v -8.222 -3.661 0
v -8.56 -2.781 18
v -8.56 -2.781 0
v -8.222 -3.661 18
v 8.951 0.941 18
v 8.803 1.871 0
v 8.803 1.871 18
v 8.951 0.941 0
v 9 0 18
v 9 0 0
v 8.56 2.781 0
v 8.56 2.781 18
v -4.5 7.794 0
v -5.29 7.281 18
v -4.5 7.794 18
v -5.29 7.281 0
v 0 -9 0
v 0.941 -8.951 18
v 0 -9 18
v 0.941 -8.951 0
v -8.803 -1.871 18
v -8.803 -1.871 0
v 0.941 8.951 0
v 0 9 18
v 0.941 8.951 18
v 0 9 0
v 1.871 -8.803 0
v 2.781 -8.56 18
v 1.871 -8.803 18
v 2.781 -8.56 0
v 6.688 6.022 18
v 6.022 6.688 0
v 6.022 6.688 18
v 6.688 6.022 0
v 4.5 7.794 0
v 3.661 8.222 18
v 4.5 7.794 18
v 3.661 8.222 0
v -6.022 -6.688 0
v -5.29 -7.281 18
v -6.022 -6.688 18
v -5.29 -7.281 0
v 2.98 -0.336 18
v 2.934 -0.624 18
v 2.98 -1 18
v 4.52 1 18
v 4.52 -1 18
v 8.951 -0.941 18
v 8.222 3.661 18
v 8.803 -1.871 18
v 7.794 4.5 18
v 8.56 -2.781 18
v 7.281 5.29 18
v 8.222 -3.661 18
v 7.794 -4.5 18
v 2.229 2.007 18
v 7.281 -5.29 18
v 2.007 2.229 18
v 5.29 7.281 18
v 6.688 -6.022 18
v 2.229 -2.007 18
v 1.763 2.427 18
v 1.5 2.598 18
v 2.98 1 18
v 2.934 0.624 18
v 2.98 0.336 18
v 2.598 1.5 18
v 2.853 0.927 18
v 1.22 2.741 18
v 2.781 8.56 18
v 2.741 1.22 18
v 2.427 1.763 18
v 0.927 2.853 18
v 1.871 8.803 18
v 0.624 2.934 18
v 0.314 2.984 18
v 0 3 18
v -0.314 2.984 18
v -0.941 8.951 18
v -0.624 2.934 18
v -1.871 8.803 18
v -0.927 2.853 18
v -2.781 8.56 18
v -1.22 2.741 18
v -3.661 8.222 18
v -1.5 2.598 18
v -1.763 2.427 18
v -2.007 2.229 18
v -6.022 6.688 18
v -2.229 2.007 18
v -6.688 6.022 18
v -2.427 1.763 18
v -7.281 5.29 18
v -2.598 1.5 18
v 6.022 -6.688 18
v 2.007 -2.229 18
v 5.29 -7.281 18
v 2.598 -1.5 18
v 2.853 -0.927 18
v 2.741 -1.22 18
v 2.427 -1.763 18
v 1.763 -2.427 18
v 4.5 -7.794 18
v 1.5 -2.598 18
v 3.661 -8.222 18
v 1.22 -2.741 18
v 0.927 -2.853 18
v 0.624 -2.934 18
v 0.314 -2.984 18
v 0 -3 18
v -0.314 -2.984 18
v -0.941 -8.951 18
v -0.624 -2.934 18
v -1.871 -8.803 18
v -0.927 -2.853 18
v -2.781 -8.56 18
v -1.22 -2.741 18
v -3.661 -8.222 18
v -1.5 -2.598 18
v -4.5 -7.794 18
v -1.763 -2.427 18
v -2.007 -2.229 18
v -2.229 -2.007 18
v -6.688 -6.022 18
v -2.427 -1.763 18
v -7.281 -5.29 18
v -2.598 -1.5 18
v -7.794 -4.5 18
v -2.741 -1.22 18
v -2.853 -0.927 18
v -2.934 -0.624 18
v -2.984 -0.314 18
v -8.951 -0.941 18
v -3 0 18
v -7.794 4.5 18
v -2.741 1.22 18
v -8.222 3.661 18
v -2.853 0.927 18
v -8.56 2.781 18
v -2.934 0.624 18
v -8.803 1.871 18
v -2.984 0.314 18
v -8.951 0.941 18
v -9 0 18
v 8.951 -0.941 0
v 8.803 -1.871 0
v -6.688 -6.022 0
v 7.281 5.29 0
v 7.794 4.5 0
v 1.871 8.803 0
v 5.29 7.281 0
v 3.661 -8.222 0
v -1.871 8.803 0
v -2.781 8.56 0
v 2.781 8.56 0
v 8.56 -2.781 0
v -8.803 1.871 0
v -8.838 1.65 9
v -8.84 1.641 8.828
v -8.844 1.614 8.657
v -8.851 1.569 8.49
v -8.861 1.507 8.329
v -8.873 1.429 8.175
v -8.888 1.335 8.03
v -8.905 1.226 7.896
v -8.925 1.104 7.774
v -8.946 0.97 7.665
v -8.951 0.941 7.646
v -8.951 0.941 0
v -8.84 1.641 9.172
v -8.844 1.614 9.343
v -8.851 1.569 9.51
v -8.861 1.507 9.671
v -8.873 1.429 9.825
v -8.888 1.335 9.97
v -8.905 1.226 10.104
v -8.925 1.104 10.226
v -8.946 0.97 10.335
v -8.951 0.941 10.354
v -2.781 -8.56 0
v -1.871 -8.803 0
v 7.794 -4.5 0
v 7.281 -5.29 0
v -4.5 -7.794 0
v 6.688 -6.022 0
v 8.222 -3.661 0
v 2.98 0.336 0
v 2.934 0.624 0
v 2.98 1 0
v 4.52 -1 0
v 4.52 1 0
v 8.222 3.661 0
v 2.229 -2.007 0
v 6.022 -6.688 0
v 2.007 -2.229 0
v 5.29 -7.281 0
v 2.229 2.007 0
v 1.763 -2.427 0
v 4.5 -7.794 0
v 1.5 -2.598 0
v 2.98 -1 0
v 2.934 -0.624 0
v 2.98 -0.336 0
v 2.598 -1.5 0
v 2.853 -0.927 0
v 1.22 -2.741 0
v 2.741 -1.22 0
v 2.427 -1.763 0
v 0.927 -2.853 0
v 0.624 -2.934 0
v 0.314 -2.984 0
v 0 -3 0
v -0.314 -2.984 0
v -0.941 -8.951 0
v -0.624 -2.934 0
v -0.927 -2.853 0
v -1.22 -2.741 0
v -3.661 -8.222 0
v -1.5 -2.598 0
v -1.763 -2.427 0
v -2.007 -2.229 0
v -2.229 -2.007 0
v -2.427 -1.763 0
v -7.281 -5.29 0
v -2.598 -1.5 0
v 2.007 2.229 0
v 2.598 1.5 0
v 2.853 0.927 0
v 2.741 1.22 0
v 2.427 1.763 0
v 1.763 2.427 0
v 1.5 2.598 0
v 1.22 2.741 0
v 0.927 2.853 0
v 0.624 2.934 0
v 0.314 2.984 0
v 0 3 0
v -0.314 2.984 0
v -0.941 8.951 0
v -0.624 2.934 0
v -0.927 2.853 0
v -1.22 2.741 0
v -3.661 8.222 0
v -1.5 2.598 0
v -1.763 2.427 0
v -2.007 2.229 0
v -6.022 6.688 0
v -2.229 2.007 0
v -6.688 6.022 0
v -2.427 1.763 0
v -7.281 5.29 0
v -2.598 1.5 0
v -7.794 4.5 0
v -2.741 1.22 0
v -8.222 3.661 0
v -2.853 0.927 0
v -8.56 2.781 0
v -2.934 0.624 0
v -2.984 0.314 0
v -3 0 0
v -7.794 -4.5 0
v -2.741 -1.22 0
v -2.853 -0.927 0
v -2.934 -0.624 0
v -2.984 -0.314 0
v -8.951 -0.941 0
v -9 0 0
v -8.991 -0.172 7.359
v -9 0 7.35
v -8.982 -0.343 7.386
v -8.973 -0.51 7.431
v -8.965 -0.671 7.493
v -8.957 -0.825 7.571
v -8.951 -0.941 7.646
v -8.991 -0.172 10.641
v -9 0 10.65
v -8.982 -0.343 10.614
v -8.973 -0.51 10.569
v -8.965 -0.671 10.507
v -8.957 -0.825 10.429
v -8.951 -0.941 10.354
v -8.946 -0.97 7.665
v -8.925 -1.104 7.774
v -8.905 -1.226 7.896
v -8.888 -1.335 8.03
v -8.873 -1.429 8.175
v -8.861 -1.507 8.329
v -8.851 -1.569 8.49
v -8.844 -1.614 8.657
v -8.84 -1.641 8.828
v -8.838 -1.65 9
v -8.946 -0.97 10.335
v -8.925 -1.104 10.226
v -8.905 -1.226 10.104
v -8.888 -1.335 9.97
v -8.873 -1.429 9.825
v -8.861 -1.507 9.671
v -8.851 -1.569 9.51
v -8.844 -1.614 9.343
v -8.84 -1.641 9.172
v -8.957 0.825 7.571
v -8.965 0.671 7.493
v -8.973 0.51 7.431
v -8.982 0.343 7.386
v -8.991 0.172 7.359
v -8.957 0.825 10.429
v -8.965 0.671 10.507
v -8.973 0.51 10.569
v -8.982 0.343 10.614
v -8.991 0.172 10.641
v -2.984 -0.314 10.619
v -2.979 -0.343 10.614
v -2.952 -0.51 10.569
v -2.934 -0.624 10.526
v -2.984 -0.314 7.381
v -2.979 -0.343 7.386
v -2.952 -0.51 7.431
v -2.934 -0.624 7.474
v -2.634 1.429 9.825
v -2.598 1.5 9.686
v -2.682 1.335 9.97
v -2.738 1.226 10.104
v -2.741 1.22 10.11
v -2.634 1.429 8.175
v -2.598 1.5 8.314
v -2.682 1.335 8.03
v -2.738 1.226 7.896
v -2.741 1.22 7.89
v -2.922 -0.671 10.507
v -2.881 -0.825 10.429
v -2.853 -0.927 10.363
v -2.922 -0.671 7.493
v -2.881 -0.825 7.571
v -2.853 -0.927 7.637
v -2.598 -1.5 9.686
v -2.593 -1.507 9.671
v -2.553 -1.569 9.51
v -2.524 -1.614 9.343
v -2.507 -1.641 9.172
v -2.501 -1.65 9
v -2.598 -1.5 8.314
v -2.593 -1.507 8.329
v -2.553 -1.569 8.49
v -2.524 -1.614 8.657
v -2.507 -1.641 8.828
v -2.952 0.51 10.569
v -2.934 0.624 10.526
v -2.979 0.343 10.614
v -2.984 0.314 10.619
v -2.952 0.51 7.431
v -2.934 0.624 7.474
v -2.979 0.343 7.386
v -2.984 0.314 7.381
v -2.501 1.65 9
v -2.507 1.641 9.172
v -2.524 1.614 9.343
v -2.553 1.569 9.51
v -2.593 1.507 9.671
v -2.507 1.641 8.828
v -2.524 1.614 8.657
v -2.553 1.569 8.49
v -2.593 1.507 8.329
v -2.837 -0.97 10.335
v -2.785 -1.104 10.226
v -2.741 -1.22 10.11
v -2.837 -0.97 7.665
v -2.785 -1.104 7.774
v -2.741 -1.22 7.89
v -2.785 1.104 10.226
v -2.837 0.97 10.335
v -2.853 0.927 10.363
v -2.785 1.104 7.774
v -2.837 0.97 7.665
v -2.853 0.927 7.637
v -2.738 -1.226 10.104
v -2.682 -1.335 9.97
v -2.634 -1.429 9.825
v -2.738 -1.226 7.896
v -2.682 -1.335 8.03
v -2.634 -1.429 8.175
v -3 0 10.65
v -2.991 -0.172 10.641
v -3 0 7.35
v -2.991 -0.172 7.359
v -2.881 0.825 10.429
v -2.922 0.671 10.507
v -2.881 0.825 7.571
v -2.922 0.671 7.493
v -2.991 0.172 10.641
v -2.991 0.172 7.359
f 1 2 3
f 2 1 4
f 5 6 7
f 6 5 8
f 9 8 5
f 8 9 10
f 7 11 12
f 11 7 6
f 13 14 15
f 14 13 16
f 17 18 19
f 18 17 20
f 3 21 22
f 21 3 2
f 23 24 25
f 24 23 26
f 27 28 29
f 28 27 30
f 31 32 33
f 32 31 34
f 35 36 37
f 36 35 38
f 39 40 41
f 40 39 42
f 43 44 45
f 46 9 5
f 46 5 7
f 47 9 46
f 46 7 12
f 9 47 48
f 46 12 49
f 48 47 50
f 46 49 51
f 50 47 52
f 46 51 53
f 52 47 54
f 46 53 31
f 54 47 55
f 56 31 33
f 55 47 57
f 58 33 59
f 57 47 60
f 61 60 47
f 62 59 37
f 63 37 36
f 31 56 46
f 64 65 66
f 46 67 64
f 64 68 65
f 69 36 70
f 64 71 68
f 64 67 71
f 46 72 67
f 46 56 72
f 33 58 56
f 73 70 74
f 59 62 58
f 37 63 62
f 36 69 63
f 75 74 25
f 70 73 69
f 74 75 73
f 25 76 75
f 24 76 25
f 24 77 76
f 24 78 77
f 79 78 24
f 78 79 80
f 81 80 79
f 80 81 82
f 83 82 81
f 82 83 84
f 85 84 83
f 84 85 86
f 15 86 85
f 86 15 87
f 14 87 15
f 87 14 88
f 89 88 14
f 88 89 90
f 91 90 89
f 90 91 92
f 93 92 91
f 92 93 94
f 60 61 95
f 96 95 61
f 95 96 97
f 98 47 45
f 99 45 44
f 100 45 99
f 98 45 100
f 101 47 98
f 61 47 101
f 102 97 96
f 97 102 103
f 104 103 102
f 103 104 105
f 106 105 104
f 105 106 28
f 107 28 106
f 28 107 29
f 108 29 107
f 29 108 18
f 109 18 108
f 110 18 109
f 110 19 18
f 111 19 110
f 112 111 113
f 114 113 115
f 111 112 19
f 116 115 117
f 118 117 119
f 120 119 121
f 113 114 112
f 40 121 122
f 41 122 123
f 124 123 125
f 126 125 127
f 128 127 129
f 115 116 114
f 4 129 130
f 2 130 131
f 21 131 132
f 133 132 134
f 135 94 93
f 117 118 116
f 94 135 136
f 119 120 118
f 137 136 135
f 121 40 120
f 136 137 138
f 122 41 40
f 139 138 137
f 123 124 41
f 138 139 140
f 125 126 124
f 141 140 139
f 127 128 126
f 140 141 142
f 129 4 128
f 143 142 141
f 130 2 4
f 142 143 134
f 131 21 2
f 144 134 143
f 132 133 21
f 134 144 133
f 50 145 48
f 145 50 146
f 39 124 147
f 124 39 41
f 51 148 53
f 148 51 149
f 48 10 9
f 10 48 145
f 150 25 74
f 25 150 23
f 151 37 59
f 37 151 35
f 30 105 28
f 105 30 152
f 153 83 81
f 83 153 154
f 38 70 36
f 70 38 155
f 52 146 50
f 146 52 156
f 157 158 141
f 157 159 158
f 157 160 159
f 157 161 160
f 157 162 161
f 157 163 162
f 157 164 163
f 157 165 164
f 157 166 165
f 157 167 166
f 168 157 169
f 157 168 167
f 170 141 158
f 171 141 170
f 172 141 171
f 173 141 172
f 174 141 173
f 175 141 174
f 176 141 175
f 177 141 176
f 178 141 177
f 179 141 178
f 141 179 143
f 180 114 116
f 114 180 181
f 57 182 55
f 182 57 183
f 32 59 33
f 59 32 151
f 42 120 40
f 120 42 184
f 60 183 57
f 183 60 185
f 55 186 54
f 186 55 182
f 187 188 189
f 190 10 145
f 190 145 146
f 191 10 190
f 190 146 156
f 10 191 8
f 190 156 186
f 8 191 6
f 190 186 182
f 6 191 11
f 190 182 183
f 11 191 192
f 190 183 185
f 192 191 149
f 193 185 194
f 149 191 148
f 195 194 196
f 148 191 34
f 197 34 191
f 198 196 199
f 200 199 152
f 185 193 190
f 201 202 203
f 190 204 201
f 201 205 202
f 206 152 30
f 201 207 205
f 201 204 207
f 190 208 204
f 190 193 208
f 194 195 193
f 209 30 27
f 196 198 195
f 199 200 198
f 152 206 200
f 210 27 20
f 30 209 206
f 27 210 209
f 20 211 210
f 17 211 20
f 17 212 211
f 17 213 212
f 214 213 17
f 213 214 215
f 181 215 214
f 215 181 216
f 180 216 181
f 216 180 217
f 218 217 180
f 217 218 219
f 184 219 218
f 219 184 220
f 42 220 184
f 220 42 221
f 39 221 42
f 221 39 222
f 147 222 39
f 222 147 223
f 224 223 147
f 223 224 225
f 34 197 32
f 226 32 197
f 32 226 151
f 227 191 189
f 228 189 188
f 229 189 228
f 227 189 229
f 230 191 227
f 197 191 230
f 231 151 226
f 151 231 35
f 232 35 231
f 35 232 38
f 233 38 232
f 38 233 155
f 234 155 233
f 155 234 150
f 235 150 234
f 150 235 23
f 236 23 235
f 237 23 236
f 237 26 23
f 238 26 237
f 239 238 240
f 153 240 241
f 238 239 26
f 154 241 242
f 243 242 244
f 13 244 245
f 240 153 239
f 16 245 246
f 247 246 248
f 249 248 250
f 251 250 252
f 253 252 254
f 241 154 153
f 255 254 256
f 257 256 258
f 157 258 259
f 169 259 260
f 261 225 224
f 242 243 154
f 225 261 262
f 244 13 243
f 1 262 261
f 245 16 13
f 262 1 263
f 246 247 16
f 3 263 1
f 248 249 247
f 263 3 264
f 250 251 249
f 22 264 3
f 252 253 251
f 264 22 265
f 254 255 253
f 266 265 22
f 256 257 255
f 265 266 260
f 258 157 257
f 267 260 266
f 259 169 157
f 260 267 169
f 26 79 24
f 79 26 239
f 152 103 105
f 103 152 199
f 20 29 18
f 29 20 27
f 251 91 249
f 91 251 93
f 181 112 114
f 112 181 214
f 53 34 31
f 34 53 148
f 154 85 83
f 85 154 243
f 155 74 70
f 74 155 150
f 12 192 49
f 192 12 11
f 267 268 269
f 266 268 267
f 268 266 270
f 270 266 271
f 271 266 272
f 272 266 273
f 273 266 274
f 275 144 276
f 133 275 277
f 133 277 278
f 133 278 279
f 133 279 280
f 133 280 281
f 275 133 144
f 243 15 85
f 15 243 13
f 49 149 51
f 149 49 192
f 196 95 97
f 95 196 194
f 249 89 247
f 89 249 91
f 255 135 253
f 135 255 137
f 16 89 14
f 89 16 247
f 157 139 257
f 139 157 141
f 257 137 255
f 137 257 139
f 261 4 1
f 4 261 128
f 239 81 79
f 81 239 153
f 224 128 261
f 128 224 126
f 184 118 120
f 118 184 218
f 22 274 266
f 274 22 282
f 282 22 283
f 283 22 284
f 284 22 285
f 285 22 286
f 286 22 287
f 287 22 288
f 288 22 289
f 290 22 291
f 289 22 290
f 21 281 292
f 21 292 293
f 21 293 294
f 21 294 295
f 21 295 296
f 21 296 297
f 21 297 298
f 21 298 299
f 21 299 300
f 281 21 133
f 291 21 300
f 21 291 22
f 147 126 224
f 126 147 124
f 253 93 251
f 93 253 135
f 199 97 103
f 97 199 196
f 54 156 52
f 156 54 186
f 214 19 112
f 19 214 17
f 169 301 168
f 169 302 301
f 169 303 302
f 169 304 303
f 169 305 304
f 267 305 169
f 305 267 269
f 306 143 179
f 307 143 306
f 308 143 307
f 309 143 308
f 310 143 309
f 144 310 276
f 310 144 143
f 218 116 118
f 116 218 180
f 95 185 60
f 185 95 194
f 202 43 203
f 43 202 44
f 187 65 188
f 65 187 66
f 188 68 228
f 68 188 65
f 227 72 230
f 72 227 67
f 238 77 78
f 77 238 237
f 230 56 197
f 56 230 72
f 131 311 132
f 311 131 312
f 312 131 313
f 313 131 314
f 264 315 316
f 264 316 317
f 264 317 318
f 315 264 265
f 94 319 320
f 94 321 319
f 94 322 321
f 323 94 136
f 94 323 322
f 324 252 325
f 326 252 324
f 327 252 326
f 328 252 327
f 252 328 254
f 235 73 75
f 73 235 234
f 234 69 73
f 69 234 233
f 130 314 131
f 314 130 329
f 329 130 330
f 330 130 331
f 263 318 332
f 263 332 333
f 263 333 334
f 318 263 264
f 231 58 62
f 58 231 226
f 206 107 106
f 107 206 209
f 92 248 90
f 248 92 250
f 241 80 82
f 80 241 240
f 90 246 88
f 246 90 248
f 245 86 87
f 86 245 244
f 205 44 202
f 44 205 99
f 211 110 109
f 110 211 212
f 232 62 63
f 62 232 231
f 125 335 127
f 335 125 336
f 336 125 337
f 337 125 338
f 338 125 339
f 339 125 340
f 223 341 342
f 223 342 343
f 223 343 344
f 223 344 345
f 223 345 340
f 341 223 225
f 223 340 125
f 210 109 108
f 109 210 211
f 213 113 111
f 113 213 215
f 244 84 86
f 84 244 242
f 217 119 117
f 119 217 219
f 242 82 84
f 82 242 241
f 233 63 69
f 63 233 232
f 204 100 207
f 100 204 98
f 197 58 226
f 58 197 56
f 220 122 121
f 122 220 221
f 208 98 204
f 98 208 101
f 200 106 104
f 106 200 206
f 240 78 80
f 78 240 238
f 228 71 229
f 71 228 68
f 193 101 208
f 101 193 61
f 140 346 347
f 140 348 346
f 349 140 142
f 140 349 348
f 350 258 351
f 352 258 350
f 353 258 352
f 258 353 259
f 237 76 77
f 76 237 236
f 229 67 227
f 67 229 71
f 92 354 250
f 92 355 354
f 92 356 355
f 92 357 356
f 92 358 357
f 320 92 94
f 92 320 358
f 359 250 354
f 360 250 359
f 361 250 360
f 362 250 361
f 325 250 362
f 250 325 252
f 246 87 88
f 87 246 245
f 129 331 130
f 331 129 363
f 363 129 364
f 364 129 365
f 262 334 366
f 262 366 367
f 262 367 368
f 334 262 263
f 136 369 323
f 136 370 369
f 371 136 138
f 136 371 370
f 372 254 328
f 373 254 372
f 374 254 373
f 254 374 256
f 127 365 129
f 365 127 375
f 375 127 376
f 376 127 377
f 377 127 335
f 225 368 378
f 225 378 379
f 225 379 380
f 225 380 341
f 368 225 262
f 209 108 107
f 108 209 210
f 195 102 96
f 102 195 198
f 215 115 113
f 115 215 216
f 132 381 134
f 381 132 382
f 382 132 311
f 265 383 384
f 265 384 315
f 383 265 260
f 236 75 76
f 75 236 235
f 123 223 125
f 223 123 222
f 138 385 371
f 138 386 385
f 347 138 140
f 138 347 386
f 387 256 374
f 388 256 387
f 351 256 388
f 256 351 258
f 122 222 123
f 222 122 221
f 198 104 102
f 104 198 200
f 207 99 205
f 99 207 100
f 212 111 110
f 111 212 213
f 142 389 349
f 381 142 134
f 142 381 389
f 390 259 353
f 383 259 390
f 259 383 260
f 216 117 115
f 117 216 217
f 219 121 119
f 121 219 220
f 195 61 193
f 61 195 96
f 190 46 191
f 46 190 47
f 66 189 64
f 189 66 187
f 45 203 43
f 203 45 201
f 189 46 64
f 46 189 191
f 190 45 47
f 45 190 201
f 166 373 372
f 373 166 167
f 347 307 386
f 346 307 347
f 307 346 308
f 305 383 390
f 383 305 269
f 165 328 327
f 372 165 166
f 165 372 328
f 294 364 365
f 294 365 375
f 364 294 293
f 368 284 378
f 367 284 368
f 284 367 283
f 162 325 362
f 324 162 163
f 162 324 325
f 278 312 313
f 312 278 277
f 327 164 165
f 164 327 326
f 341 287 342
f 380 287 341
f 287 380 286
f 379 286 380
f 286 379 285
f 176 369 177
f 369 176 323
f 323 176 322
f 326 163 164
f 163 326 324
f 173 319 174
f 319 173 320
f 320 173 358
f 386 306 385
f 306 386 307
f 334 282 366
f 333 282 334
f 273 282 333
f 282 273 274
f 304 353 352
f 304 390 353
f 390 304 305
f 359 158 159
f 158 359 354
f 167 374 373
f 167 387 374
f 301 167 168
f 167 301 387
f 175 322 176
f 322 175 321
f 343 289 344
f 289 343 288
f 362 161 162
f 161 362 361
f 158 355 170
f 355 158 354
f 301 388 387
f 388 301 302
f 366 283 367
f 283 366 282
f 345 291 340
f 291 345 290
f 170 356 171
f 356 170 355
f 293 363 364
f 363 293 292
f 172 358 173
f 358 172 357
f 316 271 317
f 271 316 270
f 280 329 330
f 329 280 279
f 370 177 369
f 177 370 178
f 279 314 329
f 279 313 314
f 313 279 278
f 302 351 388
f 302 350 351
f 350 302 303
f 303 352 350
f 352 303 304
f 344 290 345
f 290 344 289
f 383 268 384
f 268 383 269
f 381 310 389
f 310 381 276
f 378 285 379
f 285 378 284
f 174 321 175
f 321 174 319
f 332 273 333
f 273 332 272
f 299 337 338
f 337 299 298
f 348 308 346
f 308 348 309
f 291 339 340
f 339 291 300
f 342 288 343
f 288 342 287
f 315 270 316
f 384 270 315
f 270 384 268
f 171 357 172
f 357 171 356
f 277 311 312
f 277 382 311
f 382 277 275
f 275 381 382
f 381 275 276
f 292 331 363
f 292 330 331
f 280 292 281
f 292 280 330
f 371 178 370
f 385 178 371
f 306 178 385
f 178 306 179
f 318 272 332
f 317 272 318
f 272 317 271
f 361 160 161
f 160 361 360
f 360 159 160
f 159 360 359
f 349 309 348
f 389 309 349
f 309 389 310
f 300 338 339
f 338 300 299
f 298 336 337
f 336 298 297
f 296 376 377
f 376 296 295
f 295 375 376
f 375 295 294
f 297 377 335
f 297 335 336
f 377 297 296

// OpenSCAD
// Keyway hub for a 6 mm shaft.
$fn = 60;
eps = 0.02;
shaft_d = 6;
outer_d = 18;
length = 18;
key_w = 2;
key_depth = 1.5;
difference() {
    cylinder(d = outer_d, h = length);
    translate([0, 0, -eps]) cylinder(d = shaft_d, h = length + 2 * eps);
    translate([shaft_d / 2 - eps, -key_w / 2, -eps]) cube([key_depth + 2 * eps, key_w, length + 2 * eps]);
    translate([-outer_d / 2 - eps, 0, length / 2]) rotate([0, 90, 0]) cylinder(d = 3.3, h = outer_d / 2 + 2 * eps);
}
